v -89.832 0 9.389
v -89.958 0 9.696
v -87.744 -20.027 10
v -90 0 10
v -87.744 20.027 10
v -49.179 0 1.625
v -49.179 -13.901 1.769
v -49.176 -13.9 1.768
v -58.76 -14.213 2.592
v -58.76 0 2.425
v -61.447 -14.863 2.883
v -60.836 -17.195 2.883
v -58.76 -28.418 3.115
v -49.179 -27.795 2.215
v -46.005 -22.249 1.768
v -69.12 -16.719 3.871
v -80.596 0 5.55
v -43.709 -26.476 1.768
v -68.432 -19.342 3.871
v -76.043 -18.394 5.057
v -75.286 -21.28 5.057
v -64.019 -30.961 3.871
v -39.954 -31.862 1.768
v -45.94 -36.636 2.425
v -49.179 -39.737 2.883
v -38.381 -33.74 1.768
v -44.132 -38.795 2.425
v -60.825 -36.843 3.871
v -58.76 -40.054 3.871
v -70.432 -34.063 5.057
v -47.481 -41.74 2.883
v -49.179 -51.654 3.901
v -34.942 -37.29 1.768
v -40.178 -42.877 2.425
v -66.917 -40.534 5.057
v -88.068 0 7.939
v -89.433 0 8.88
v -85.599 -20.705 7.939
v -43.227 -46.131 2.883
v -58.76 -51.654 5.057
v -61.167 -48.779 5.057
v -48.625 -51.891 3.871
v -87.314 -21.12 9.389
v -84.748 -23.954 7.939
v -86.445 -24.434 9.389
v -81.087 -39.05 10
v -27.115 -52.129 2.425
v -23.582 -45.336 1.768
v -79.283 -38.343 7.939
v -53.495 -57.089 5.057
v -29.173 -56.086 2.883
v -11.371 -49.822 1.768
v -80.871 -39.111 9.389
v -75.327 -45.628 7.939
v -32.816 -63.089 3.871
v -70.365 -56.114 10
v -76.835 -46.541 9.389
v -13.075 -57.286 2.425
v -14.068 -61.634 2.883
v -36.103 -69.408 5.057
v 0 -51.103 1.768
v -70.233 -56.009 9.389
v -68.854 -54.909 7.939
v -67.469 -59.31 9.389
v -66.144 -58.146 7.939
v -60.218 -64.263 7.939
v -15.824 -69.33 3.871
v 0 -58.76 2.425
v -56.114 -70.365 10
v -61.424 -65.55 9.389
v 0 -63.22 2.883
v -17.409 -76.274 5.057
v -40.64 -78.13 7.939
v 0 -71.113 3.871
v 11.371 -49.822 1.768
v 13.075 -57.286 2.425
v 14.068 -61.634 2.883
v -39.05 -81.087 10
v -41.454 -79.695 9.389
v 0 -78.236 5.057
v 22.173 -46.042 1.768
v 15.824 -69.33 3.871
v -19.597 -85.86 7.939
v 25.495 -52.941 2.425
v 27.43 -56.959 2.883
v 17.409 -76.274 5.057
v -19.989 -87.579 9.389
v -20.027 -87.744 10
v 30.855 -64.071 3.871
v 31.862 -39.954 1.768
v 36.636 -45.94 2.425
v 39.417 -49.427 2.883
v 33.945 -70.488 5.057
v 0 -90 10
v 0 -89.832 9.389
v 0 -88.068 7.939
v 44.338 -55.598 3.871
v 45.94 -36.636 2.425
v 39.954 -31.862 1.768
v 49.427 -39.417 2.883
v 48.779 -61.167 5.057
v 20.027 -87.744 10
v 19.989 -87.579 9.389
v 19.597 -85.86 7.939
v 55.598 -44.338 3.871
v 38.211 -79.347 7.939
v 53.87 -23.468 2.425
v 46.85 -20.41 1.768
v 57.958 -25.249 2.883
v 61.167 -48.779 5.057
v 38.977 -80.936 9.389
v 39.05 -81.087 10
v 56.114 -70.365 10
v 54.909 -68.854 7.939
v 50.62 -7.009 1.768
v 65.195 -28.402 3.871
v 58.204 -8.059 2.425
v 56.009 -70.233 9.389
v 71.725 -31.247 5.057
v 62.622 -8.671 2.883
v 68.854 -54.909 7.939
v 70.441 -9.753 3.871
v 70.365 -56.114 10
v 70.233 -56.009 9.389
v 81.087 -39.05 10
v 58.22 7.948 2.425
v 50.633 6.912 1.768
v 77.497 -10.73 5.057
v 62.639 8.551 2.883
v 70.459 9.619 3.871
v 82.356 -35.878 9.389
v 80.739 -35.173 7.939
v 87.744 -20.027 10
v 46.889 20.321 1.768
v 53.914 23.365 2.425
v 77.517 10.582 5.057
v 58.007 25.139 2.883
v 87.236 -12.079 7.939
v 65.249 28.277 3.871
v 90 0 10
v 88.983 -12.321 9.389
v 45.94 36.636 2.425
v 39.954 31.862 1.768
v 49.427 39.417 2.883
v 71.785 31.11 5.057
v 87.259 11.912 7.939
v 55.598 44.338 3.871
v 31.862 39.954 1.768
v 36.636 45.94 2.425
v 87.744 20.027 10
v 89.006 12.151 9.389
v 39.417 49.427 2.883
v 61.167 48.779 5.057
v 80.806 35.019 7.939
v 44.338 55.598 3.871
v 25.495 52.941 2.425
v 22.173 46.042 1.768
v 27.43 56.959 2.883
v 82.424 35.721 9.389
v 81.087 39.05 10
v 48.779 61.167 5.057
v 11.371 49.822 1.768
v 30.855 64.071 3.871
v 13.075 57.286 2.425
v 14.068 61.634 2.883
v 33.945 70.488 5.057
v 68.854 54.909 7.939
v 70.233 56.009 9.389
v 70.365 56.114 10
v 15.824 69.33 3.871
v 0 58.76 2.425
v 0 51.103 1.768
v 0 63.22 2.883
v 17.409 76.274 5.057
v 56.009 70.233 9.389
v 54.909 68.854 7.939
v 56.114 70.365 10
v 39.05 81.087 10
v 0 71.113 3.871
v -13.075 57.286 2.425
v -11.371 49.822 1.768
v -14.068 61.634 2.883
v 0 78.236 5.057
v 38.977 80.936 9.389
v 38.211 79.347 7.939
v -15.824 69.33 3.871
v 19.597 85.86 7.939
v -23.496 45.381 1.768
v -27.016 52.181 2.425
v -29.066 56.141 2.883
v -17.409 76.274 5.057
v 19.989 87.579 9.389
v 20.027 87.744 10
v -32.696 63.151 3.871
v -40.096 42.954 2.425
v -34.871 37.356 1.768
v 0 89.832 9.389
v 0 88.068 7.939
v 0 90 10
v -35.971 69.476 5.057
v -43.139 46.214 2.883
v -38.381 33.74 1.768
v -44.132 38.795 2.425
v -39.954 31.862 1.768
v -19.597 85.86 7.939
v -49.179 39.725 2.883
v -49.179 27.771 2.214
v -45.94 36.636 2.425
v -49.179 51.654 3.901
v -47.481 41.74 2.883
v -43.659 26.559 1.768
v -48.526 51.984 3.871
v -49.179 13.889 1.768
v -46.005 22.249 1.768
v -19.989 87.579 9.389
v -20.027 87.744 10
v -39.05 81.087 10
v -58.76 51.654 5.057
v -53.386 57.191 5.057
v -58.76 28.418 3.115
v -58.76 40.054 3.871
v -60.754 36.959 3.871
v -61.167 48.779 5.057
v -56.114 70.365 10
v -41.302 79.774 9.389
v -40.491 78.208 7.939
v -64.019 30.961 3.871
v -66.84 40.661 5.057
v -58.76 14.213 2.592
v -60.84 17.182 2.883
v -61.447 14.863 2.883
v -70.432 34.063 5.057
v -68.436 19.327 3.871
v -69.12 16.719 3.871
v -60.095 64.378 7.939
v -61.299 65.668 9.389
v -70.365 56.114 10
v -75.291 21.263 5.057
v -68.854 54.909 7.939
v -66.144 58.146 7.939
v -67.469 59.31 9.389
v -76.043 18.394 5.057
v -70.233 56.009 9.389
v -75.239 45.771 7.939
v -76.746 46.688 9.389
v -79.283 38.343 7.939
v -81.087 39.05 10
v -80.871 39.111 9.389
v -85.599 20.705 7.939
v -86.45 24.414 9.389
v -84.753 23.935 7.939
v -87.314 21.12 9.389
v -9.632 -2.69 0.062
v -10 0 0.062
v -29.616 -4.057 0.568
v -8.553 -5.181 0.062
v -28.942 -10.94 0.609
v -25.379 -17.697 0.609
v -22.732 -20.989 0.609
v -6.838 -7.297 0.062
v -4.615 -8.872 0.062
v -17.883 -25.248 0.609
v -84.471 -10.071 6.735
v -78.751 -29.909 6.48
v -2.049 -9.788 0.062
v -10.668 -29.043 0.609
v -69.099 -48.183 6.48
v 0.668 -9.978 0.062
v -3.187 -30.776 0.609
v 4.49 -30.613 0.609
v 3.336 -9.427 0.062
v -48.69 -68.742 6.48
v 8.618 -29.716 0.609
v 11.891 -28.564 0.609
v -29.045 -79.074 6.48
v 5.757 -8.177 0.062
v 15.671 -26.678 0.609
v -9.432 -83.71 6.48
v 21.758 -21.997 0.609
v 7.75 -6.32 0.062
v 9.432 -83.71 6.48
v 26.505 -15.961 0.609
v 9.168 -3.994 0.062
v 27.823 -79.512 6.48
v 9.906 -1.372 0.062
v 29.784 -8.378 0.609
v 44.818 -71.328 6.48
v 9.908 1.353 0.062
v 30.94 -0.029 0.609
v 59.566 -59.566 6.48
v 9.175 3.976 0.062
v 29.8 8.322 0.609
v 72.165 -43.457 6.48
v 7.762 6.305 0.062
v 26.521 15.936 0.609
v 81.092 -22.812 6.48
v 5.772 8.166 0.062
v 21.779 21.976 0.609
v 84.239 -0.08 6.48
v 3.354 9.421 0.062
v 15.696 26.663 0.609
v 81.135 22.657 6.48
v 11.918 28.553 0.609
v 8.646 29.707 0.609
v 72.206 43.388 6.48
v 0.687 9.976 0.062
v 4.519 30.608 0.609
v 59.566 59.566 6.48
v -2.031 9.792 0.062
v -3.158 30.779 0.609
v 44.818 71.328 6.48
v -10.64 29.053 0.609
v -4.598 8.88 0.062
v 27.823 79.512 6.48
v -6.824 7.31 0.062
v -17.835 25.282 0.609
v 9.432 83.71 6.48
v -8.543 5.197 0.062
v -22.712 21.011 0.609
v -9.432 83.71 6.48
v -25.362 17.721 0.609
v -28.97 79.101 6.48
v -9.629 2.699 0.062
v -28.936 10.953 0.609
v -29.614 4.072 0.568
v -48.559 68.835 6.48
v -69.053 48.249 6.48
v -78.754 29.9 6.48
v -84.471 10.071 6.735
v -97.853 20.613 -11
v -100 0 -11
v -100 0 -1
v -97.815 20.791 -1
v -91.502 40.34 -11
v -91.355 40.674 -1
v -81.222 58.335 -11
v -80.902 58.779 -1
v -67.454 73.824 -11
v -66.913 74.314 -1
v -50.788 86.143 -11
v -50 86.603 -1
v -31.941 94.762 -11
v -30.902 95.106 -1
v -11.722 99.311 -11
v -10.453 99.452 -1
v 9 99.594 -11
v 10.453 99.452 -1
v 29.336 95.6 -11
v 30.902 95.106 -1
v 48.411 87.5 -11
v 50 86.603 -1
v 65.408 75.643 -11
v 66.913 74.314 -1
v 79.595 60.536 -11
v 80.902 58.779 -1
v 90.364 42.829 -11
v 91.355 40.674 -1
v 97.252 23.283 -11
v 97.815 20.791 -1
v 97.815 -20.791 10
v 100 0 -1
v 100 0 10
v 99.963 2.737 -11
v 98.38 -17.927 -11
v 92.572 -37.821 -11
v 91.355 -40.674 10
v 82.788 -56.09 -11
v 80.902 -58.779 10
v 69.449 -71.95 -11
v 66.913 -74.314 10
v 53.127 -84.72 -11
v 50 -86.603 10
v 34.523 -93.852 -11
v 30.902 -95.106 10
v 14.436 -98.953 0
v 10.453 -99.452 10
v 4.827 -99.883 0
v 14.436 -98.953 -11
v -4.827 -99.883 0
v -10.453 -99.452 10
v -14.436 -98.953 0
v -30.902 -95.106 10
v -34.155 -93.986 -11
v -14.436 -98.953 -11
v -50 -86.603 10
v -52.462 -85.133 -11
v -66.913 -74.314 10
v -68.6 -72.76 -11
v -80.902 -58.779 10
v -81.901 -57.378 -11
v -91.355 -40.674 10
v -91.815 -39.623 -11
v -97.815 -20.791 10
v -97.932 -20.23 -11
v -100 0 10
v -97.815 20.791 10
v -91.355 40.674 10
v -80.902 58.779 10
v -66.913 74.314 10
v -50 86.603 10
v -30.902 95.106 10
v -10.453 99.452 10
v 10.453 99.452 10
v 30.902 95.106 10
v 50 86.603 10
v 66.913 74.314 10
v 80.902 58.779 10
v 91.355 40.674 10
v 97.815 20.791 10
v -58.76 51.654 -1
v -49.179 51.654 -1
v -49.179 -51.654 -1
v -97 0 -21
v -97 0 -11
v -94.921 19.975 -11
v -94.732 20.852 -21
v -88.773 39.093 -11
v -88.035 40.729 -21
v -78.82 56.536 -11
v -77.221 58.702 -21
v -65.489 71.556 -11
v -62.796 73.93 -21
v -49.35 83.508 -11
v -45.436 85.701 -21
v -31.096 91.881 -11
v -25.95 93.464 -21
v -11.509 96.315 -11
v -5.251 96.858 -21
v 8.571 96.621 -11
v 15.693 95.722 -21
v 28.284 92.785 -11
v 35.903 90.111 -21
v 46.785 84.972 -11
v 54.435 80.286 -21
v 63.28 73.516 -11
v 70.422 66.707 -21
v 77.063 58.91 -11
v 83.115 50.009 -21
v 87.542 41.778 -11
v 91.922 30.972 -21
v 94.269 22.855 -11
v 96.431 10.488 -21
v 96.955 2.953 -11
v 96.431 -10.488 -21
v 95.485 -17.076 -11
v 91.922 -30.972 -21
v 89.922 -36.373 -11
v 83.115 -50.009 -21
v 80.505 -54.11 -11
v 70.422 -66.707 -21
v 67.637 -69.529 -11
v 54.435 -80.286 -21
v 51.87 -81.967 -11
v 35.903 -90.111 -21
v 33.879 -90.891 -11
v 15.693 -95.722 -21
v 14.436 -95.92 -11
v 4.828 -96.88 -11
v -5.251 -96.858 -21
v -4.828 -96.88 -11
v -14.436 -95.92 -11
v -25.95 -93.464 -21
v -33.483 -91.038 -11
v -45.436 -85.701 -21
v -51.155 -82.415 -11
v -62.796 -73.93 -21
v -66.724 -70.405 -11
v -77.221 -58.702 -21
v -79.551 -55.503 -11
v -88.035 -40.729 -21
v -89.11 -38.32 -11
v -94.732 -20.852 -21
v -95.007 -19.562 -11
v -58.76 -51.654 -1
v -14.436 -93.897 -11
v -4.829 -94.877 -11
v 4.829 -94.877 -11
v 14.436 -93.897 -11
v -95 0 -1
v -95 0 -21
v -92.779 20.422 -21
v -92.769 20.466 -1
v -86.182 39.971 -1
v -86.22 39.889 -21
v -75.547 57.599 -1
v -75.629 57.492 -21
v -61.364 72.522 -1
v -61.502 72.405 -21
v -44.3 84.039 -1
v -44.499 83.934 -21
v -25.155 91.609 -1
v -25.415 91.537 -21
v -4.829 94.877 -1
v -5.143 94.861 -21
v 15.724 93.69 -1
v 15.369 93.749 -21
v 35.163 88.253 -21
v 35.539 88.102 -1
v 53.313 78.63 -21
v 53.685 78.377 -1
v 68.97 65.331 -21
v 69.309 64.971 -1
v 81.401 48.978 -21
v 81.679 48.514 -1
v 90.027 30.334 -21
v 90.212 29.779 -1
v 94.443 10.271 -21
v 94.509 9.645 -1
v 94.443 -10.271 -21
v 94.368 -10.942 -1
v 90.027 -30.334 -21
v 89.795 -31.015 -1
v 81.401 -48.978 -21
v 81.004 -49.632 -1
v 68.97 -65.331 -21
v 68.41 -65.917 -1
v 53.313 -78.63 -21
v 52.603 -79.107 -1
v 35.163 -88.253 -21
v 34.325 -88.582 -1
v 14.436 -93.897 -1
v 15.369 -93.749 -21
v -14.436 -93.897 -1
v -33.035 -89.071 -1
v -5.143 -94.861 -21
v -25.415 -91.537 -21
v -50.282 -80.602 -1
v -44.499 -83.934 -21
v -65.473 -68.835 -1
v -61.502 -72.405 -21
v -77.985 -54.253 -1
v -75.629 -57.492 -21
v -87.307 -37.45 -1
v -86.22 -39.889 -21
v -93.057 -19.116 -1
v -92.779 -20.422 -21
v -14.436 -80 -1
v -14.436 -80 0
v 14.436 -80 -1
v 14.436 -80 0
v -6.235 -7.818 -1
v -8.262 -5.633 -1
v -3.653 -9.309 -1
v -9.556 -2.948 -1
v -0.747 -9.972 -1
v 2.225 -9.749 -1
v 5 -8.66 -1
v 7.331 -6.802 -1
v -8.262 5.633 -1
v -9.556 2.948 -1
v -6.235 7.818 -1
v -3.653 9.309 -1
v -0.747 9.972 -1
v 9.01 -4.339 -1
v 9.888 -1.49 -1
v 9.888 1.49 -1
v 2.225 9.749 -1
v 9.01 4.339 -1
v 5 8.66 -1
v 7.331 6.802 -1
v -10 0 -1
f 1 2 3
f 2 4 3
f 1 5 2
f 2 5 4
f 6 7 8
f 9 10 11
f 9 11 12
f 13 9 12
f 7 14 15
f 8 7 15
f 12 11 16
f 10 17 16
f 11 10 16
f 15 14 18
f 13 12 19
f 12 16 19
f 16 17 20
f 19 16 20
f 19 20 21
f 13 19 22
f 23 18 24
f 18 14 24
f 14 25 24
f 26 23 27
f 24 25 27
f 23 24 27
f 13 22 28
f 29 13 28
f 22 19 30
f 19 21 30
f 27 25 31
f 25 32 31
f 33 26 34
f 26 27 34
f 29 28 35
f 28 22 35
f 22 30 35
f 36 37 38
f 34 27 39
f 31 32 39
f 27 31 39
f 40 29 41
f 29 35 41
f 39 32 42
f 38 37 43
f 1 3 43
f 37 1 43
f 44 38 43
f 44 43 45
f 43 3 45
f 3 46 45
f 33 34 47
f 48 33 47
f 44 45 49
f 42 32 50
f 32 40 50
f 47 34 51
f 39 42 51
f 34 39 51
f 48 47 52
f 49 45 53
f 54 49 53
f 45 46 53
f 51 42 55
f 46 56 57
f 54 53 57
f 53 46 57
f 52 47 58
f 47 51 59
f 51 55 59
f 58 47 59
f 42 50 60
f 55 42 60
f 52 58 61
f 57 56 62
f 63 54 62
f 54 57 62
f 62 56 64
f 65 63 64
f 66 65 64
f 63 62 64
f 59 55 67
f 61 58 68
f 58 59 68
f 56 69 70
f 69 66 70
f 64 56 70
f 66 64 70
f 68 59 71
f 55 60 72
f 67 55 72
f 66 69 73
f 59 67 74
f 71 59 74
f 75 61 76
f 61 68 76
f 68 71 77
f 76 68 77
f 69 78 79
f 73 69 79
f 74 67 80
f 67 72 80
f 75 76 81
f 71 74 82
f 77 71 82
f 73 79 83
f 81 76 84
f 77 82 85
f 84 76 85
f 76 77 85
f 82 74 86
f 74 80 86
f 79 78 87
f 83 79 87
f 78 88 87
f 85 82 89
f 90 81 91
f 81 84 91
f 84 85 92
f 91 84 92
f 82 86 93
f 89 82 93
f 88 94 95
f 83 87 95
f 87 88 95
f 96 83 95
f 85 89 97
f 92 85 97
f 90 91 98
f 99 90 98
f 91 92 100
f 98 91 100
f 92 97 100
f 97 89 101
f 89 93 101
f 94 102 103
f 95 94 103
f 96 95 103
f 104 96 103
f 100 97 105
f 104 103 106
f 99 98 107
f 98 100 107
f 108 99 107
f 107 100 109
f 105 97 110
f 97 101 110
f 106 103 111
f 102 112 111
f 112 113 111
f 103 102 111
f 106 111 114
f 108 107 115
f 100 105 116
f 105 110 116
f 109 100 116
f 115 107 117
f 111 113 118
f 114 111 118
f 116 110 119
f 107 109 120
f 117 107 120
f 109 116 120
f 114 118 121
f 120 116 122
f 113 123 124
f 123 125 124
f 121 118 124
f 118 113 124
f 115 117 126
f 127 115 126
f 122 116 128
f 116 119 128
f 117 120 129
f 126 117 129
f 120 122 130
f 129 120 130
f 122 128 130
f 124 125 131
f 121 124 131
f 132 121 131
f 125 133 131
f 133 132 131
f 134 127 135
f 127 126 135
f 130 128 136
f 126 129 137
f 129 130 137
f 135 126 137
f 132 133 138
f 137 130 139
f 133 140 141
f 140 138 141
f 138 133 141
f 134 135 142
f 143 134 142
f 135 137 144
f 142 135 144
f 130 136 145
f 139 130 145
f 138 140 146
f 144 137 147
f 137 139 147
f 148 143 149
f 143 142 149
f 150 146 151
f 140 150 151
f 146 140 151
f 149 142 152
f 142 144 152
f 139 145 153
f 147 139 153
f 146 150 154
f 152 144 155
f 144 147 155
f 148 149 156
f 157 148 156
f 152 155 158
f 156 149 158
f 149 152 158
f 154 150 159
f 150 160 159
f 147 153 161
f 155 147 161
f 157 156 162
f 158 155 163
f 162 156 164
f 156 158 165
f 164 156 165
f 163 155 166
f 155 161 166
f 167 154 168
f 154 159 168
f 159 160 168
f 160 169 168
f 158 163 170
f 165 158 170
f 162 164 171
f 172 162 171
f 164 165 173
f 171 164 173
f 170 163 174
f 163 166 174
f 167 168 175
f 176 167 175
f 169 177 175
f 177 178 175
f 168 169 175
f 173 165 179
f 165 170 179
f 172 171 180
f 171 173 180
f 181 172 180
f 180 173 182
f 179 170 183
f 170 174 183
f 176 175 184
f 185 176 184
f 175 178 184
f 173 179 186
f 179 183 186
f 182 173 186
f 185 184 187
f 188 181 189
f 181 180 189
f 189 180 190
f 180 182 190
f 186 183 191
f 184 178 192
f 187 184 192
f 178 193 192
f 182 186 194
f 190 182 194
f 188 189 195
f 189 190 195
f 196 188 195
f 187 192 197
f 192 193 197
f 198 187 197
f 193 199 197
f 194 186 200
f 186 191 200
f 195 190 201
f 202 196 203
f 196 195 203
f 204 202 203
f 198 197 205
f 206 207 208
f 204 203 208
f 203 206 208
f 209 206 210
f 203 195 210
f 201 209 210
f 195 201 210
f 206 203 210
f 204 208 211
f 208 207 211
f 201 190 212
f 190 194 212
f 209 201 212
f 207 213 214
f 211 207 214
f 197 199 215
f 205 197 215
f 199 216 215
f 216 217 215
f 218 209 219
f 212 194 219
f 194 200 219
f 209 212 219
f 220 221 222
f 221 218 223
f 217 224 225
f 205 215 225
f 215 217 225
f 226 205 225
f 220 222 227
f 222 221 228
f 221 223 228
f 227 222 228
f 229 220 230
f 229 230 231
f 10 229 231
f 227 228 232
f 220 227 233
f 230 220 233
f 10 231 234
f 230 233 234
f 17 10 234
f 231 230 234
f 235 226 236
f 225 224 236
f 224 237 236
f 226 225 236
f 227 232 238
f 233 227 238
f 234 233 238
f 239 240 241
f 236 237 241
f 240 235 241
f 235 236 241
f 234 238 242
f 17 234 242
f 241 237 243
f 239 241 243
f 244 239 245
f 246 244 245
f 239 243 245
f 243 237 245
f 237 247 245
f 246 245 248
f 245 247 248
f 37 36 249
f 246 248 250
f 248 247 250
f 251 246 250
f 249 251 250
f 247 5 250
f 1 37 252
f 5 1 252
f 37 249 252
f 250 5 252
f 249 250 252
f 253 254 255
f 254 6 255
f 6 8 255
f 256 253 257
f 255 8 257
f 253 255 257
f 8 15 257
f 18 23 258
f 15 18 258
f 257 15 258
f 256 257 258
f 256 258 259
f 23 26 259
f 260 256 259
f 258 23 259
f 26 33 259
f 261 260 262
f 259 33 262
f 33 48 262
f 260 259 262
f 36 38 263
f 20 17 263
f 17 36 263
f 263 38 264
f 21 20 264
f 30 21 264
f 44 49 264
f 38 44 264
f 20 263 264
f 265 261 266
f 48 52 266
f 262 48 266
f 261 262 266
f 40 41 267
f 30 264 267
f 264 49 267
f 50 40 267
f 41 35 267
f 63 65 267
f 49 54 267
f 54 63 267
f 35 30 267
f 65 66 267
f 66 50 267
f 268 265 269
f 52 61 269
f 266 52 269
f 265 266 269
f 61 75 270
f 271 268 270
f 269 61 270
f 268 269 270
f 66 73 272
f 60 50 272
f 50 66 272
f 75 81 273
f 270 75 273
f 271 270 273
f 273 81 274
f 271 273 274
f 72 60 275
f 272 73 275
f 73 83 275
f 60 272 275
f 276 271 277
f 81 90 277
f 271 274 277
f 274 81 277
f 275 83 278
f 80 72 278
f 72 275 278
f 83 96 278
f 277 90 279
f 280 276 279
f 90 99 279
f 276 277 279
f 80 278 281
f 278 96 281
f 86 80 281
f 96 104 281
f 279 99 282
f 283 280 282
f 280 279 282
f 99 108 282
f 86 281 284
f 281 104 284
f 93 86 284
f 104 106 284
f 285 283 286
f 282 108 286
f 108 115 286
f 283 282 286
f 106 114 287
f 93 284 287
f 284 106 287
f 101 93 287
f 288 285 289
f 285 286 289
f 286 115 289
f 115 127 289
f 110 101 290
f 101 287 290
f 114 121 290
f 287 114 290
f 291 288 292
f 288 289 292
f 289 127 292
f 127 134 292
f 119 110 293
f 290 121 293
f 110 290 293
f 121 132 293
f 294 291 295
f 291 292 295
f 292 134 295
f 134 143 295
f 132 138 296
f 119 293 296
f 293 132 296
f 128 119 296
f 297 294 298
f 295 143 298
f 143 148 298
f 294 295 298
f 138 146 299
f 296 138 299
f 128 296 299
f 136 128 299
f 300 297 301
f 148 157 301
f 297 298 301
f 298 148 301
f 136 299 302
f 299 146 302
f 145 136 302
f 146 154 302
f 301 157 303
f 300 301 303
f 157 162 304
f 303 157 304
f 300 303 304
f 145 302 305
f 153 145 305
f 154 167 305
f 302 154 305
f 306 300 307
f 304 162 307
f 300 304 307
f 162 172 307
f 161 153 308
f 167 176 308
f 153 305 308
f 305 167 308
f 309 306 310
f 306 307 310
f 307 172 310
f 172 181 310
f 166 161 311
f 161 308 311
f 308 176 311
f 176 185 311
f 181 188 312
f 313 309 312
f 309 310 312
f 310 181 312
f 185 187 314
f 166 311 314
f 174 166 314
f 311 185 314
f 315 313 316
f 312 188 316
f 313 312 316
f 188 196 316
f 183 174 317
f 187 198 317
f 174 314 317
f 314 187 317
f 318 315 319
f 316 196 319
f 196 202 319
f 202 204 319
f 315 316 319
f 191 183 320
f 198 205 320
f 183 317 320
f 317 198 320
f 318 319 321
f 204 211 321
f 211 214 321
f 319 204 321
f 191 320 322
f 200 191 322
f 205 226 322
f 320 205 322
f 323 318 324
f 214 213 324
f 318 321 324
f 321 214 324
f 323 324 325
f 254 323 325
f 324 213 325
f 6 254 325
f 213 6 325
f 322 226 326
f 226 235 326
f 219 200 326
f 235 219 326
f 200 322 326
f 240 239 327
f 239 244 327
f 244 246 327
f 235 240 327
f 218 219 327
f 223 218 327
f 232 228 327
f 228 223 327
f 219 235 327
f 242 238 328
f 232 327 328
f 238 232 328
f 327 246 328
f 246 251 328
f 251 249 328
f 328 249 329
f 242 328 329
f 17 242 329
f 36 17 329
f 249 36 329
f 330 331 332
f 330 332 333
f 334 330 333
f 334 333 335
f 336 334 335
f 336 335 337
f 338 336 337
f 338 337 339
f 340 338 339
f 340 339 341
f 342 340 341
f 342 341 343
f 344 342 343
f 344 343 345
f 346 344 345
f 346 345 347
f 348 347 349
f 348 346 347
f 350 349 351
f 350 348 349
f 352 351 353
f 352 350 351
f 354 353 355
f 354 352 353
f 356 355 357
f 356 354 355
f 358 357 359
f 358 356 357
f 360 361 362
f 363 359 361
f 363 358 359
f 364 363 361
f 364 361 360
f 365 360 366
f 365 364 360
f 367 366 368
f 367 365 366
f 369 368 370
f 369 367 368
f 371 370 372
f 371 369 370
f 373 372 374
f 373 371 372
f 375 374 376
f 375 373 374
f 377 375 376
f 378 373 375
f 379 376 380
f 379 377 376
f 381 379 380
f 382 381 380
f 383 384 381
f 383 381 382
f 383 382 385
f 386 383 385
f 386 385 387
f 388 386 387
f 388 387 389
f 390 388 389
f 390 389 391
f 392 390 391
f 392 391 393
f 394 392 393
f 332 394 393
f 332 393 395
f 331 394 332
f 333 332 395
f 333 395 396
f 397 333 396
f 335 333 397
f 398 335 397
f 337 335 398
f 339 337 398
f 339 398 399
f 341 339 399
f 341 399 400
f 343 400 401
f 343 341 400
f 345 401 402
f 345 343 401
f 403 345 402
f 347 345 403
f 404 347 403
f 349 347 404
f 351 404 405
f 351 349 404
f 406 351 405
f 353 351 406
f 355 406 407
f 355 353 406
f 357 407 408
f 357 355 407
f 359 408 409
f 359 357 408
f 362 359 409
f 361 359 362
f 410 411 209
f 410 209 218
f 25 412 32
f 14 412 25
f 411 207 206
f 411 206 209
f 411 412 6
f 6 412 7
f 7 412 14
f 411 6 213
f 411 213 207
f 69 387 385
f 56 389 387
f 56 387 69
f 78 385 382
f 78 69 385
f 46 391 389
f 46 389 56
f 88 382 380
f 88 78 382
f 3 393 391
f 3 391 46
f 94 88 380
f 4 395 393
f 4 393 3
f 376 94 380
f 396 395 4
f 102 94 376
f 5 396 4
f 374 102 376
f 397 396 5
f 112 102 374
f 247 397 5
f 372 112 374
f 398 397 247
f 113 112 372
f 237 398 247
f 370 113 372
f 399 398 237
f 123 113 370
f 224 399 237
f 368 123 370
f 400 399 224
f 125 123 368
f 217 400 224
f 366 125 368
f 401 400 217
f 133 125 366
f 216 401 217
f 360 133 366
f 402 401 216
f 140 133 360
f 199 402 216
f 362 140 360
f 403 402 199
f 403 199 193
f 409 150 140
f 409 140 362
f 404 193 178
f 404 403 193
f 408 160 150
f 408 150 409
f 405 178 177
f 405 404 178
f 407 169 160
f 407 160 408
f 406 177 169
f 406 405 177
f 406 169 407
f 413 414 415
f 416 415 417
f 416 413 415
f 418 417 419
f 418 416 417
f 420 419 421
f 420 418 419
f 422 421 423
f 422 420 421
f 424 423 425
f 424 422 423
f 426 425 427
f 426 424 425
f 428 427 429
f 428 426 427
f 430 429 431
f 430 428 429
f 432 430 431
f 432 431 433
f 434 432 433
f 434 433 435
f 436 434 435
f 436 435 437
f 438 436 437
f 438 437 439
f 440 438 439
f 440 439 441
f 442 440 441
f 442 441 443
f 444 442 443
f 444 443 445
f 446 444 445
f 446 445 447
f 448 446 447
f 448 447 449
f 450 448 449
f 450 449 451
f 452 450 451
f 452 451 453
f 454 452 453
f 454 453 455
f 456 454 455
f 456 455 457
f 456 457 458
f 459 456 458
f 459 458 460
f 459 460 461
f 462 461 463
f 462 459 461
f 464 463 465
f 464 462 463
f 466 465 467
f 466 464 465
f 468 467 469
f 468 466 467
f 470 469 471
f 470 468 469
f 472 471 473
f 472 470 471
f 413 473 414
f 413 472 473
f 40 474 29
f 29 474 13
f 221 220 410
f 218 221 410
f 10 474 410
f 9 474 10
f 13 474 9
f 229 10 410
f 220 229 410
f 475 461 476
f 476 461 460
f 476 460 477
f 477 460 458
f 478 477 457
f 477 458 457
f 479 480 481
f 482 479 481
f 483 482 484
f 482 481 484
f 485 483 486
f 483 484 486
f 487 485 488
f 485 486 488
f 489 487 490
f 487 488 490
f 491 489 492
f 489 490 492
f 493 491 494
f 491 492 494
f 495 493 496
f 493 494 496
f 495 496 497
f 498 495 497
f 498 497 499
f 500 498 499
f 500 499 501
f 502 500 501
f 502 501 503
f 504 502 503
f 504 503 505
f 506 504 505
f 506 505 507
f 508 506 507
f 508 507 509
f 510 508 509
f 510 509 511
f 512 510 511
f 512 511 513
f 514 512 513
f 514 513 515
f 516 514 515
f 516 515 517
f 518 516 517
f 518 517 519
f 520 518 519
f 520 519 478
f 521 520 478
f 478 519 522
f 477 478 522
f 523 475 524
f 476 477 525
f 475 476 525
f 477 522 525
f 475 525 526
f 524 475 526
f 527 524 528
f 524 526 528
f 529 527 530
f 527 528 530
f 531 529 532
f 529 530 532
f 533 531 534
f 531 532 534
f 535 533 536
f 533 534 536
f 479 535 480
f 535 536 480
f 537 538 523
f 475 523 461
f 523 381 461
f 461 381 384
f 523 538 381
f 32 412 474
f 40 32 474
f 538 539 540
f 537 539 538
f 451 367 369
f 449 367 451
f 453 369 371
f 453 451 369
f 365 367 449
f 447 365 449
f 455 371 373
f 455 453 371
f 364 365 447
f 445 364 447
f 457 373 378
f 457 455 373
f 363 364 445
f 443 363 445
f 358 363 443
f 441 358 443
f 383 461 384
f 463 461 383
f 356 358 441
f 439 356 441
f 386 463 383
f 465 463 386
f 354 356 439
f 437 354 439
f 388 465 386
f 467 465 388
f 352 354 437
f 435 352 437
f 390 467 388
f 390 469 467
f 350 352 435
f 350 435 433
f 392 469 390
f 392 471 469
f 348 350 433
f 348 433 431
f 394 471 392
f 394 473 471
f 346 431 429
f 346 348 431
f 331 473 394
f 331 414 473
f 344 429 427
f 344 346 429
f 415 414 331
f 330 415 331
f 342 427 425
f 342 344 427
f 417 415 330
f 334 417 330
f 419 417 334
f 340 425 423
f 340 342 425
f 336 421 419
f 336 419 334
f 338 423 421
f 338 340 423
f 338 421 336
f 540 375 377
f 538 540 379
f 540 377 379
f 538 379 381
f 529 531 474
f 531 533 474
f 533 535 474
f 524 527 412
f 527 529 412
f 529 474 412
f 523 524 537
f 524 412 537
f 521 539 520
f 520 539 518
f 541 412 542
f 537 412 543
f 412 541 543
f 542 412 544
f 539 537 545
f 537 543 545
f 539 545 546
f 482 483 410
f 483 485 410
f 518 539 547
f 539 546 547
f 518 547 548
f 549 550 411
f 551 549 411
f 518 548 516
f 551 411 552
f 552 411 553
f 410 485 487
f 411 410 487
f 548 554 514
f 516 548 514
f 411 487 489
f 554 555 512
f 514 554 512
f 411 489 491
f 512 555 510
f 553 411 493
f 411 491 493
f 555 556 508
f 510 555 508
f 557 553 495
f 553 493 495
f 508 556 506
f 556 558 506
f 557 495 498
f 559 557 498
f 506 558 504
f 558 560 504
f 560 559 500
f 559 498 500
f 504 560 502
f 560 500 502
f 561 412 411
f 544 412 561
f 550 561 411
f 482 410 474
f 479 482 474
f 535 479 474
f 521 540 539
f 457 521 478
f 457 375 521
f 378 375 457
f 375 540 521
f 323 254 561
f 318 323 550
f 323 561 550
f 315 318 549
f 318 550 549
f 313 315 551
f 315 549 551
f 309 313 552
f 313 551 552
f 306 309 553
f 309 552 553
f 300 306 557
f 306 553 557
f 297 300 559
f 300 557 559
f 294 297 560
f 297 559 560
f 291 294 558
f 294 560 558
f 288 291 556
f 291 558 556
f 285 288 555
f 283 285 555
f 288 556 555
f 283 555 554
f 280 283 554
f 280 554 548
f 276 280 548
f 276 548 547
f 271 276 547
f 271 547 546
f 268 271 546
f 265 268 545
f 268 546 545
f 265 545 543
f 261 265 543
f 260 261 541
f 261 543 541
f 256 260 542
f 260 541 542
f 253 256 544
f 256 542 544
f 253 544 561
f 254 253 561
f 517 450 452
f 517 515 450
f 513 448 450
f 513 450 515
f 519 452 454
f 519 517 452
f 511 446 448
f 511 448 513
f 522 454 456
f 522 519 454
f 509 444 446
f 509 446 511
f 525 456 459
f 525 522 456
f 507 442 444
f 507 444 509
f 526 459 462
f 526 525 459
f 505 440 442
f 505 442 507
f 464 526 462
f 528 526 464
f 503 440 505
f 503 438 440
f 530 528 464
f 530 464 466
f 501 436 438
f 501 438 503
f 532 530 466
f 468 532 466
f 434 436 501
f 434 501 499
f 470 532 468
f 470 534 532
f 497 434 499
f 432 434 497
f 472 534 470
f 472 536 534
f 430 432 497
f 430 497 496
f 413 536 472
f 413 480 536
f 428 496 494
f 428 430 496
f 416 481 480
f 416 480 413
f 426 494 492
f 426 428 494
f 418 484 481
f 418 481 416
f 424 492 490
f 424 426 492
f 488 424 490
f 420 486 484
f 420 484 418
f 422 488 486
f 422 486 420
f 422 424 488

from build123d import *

# Parameters (mm, degrees)
SKETCH_1_R          = 100
EXTRUDE_5_DEPTH     = 10
EXTRUDE_START       = -1
SKETCH_9_R          = 100
EXTRUDE_7_DEPTH     = 1
EXTRUDE_START_2     = 10
SKETCH_11_R         = 100
SKETCH_11_R_2       = 95
EXTRUDE_8_DEPTH     = 10
SKETCH_12_R         = 97
SKETCH_12_R_2       = 95
EXTRUDE_9_DEPTH     = 10
SKETCH_14_R         = 10
SKETCH_14_W         = 9.580387857
SKETCH_14_H         = 103.308515728
CUT_EXTRUDE_4_DEPTH = 20
SKETCH_17_W         = 14.435902612
SKETCH_17_H         = 11
CUT_EXTRUDE_5_DEPTH = 20


with BuildPart() as part:
    # 草图1 → 凸台-拉伸5 (new body)
    with BuildSketch(Plane.XY):
        Circle(SKETCH_1_R)
    extrude(amount=EXTRUDE_5_DEPTH)

    # 草图9 → 凸台-拉伸7 (add)
    with BuildSketch(Plane.XY.offset(EXTRUDE_START)):
        Circle(SKETCH_9_R)
    extrude(amount=EXTRUDE_7_DEPTH)

    # 草图7 → 切除-旋转2 (revolve, cut)
    with BuildSketch(Plane(origin=(0, 0, 0), x_dir=(1, 0, 0), z_dir=(0, 1, 0))):
        with BuildLine():
            Line((0, 0), (0, -10))
            Line((0, -10), (-90, -10))
            add(Edge.make_bspline(
                [(0, 0), (-90, 0), (-90, -10)],
                knots=[1.570796327, 1.570796327, 1.570796327, 3.141592654, 3.141592654, 3.141592654], degree=2, weights=[1, 0.707106781, 1]))
        make_face()
    revolve(axis=Axis((0, 0, 0), (0, 0, 1)), mode=Mode.SUBTRACT)

    # 草图11 → 凸台-拉伸8 (add)
    with BuildSketch(Plane(origin=(0, 0, -1), x_dir=(-1, 0, 0), z_dir=(0, 0, -1)).offset(EXTRUDE_START_2)):
        Circle(SKETCH_11_R)
        Circle(SKETCH_11_R_2, mode=Mode.SUBTRACT)
    extrude(amount=-EXTRUDE_8_DEPTH)

    # 草图12 → 凸台-拉伸9 (add)
    with BuildSketch(Plane(origin=(0, 0, -11), x_dir=(-1, 0, 0), z_dir=(0, 0, -1)).offset(EXTRUDE_START_2)):
        Circle(SKETCH_12_R)
        Circle(SKETCH_12_R_2, mode=Mode.SUBTRACT)
    extrude(amount=-EXTRUDE_9_DEPTH)

    # 草图14 → 切除-拉伸4 (cut)
    with BuildSketch(Plane(origin=(0, 0, -11), x_dir=(-1, 0, 0), z_dir=(0, 0, -1))):
        Circle(SKETCH_14_R)
        with Locations((53.969518264, 0)):
            Rectangle(SKETCH_14_W, SKETCH_14_H)
    extrude(amount=-CUT_EXTRUDE_4_DEPTH, mode=Mode.SUBTRACT)

    # 草图17 → 切除-拉伸5 (cut)
    with BuildSketch(Plane(origin=(0, -100, 0), x_dir=(-1, 0, 0), z_dir=(0, -1, 0))):
        with Locations((-7.217951306, 5.5)):
            Rectangle(SKETCH_17_W, SKETCH_17_H)
        with Locations((7.217951306, 5.5)):
            Rectangle(SKETCH_17_W, SKETCH_17_H)
    extrude(amount=-CUT_EXTRUDE_5_DEPTH, mode=Mode.SUBTRACT)


solid = part.part
